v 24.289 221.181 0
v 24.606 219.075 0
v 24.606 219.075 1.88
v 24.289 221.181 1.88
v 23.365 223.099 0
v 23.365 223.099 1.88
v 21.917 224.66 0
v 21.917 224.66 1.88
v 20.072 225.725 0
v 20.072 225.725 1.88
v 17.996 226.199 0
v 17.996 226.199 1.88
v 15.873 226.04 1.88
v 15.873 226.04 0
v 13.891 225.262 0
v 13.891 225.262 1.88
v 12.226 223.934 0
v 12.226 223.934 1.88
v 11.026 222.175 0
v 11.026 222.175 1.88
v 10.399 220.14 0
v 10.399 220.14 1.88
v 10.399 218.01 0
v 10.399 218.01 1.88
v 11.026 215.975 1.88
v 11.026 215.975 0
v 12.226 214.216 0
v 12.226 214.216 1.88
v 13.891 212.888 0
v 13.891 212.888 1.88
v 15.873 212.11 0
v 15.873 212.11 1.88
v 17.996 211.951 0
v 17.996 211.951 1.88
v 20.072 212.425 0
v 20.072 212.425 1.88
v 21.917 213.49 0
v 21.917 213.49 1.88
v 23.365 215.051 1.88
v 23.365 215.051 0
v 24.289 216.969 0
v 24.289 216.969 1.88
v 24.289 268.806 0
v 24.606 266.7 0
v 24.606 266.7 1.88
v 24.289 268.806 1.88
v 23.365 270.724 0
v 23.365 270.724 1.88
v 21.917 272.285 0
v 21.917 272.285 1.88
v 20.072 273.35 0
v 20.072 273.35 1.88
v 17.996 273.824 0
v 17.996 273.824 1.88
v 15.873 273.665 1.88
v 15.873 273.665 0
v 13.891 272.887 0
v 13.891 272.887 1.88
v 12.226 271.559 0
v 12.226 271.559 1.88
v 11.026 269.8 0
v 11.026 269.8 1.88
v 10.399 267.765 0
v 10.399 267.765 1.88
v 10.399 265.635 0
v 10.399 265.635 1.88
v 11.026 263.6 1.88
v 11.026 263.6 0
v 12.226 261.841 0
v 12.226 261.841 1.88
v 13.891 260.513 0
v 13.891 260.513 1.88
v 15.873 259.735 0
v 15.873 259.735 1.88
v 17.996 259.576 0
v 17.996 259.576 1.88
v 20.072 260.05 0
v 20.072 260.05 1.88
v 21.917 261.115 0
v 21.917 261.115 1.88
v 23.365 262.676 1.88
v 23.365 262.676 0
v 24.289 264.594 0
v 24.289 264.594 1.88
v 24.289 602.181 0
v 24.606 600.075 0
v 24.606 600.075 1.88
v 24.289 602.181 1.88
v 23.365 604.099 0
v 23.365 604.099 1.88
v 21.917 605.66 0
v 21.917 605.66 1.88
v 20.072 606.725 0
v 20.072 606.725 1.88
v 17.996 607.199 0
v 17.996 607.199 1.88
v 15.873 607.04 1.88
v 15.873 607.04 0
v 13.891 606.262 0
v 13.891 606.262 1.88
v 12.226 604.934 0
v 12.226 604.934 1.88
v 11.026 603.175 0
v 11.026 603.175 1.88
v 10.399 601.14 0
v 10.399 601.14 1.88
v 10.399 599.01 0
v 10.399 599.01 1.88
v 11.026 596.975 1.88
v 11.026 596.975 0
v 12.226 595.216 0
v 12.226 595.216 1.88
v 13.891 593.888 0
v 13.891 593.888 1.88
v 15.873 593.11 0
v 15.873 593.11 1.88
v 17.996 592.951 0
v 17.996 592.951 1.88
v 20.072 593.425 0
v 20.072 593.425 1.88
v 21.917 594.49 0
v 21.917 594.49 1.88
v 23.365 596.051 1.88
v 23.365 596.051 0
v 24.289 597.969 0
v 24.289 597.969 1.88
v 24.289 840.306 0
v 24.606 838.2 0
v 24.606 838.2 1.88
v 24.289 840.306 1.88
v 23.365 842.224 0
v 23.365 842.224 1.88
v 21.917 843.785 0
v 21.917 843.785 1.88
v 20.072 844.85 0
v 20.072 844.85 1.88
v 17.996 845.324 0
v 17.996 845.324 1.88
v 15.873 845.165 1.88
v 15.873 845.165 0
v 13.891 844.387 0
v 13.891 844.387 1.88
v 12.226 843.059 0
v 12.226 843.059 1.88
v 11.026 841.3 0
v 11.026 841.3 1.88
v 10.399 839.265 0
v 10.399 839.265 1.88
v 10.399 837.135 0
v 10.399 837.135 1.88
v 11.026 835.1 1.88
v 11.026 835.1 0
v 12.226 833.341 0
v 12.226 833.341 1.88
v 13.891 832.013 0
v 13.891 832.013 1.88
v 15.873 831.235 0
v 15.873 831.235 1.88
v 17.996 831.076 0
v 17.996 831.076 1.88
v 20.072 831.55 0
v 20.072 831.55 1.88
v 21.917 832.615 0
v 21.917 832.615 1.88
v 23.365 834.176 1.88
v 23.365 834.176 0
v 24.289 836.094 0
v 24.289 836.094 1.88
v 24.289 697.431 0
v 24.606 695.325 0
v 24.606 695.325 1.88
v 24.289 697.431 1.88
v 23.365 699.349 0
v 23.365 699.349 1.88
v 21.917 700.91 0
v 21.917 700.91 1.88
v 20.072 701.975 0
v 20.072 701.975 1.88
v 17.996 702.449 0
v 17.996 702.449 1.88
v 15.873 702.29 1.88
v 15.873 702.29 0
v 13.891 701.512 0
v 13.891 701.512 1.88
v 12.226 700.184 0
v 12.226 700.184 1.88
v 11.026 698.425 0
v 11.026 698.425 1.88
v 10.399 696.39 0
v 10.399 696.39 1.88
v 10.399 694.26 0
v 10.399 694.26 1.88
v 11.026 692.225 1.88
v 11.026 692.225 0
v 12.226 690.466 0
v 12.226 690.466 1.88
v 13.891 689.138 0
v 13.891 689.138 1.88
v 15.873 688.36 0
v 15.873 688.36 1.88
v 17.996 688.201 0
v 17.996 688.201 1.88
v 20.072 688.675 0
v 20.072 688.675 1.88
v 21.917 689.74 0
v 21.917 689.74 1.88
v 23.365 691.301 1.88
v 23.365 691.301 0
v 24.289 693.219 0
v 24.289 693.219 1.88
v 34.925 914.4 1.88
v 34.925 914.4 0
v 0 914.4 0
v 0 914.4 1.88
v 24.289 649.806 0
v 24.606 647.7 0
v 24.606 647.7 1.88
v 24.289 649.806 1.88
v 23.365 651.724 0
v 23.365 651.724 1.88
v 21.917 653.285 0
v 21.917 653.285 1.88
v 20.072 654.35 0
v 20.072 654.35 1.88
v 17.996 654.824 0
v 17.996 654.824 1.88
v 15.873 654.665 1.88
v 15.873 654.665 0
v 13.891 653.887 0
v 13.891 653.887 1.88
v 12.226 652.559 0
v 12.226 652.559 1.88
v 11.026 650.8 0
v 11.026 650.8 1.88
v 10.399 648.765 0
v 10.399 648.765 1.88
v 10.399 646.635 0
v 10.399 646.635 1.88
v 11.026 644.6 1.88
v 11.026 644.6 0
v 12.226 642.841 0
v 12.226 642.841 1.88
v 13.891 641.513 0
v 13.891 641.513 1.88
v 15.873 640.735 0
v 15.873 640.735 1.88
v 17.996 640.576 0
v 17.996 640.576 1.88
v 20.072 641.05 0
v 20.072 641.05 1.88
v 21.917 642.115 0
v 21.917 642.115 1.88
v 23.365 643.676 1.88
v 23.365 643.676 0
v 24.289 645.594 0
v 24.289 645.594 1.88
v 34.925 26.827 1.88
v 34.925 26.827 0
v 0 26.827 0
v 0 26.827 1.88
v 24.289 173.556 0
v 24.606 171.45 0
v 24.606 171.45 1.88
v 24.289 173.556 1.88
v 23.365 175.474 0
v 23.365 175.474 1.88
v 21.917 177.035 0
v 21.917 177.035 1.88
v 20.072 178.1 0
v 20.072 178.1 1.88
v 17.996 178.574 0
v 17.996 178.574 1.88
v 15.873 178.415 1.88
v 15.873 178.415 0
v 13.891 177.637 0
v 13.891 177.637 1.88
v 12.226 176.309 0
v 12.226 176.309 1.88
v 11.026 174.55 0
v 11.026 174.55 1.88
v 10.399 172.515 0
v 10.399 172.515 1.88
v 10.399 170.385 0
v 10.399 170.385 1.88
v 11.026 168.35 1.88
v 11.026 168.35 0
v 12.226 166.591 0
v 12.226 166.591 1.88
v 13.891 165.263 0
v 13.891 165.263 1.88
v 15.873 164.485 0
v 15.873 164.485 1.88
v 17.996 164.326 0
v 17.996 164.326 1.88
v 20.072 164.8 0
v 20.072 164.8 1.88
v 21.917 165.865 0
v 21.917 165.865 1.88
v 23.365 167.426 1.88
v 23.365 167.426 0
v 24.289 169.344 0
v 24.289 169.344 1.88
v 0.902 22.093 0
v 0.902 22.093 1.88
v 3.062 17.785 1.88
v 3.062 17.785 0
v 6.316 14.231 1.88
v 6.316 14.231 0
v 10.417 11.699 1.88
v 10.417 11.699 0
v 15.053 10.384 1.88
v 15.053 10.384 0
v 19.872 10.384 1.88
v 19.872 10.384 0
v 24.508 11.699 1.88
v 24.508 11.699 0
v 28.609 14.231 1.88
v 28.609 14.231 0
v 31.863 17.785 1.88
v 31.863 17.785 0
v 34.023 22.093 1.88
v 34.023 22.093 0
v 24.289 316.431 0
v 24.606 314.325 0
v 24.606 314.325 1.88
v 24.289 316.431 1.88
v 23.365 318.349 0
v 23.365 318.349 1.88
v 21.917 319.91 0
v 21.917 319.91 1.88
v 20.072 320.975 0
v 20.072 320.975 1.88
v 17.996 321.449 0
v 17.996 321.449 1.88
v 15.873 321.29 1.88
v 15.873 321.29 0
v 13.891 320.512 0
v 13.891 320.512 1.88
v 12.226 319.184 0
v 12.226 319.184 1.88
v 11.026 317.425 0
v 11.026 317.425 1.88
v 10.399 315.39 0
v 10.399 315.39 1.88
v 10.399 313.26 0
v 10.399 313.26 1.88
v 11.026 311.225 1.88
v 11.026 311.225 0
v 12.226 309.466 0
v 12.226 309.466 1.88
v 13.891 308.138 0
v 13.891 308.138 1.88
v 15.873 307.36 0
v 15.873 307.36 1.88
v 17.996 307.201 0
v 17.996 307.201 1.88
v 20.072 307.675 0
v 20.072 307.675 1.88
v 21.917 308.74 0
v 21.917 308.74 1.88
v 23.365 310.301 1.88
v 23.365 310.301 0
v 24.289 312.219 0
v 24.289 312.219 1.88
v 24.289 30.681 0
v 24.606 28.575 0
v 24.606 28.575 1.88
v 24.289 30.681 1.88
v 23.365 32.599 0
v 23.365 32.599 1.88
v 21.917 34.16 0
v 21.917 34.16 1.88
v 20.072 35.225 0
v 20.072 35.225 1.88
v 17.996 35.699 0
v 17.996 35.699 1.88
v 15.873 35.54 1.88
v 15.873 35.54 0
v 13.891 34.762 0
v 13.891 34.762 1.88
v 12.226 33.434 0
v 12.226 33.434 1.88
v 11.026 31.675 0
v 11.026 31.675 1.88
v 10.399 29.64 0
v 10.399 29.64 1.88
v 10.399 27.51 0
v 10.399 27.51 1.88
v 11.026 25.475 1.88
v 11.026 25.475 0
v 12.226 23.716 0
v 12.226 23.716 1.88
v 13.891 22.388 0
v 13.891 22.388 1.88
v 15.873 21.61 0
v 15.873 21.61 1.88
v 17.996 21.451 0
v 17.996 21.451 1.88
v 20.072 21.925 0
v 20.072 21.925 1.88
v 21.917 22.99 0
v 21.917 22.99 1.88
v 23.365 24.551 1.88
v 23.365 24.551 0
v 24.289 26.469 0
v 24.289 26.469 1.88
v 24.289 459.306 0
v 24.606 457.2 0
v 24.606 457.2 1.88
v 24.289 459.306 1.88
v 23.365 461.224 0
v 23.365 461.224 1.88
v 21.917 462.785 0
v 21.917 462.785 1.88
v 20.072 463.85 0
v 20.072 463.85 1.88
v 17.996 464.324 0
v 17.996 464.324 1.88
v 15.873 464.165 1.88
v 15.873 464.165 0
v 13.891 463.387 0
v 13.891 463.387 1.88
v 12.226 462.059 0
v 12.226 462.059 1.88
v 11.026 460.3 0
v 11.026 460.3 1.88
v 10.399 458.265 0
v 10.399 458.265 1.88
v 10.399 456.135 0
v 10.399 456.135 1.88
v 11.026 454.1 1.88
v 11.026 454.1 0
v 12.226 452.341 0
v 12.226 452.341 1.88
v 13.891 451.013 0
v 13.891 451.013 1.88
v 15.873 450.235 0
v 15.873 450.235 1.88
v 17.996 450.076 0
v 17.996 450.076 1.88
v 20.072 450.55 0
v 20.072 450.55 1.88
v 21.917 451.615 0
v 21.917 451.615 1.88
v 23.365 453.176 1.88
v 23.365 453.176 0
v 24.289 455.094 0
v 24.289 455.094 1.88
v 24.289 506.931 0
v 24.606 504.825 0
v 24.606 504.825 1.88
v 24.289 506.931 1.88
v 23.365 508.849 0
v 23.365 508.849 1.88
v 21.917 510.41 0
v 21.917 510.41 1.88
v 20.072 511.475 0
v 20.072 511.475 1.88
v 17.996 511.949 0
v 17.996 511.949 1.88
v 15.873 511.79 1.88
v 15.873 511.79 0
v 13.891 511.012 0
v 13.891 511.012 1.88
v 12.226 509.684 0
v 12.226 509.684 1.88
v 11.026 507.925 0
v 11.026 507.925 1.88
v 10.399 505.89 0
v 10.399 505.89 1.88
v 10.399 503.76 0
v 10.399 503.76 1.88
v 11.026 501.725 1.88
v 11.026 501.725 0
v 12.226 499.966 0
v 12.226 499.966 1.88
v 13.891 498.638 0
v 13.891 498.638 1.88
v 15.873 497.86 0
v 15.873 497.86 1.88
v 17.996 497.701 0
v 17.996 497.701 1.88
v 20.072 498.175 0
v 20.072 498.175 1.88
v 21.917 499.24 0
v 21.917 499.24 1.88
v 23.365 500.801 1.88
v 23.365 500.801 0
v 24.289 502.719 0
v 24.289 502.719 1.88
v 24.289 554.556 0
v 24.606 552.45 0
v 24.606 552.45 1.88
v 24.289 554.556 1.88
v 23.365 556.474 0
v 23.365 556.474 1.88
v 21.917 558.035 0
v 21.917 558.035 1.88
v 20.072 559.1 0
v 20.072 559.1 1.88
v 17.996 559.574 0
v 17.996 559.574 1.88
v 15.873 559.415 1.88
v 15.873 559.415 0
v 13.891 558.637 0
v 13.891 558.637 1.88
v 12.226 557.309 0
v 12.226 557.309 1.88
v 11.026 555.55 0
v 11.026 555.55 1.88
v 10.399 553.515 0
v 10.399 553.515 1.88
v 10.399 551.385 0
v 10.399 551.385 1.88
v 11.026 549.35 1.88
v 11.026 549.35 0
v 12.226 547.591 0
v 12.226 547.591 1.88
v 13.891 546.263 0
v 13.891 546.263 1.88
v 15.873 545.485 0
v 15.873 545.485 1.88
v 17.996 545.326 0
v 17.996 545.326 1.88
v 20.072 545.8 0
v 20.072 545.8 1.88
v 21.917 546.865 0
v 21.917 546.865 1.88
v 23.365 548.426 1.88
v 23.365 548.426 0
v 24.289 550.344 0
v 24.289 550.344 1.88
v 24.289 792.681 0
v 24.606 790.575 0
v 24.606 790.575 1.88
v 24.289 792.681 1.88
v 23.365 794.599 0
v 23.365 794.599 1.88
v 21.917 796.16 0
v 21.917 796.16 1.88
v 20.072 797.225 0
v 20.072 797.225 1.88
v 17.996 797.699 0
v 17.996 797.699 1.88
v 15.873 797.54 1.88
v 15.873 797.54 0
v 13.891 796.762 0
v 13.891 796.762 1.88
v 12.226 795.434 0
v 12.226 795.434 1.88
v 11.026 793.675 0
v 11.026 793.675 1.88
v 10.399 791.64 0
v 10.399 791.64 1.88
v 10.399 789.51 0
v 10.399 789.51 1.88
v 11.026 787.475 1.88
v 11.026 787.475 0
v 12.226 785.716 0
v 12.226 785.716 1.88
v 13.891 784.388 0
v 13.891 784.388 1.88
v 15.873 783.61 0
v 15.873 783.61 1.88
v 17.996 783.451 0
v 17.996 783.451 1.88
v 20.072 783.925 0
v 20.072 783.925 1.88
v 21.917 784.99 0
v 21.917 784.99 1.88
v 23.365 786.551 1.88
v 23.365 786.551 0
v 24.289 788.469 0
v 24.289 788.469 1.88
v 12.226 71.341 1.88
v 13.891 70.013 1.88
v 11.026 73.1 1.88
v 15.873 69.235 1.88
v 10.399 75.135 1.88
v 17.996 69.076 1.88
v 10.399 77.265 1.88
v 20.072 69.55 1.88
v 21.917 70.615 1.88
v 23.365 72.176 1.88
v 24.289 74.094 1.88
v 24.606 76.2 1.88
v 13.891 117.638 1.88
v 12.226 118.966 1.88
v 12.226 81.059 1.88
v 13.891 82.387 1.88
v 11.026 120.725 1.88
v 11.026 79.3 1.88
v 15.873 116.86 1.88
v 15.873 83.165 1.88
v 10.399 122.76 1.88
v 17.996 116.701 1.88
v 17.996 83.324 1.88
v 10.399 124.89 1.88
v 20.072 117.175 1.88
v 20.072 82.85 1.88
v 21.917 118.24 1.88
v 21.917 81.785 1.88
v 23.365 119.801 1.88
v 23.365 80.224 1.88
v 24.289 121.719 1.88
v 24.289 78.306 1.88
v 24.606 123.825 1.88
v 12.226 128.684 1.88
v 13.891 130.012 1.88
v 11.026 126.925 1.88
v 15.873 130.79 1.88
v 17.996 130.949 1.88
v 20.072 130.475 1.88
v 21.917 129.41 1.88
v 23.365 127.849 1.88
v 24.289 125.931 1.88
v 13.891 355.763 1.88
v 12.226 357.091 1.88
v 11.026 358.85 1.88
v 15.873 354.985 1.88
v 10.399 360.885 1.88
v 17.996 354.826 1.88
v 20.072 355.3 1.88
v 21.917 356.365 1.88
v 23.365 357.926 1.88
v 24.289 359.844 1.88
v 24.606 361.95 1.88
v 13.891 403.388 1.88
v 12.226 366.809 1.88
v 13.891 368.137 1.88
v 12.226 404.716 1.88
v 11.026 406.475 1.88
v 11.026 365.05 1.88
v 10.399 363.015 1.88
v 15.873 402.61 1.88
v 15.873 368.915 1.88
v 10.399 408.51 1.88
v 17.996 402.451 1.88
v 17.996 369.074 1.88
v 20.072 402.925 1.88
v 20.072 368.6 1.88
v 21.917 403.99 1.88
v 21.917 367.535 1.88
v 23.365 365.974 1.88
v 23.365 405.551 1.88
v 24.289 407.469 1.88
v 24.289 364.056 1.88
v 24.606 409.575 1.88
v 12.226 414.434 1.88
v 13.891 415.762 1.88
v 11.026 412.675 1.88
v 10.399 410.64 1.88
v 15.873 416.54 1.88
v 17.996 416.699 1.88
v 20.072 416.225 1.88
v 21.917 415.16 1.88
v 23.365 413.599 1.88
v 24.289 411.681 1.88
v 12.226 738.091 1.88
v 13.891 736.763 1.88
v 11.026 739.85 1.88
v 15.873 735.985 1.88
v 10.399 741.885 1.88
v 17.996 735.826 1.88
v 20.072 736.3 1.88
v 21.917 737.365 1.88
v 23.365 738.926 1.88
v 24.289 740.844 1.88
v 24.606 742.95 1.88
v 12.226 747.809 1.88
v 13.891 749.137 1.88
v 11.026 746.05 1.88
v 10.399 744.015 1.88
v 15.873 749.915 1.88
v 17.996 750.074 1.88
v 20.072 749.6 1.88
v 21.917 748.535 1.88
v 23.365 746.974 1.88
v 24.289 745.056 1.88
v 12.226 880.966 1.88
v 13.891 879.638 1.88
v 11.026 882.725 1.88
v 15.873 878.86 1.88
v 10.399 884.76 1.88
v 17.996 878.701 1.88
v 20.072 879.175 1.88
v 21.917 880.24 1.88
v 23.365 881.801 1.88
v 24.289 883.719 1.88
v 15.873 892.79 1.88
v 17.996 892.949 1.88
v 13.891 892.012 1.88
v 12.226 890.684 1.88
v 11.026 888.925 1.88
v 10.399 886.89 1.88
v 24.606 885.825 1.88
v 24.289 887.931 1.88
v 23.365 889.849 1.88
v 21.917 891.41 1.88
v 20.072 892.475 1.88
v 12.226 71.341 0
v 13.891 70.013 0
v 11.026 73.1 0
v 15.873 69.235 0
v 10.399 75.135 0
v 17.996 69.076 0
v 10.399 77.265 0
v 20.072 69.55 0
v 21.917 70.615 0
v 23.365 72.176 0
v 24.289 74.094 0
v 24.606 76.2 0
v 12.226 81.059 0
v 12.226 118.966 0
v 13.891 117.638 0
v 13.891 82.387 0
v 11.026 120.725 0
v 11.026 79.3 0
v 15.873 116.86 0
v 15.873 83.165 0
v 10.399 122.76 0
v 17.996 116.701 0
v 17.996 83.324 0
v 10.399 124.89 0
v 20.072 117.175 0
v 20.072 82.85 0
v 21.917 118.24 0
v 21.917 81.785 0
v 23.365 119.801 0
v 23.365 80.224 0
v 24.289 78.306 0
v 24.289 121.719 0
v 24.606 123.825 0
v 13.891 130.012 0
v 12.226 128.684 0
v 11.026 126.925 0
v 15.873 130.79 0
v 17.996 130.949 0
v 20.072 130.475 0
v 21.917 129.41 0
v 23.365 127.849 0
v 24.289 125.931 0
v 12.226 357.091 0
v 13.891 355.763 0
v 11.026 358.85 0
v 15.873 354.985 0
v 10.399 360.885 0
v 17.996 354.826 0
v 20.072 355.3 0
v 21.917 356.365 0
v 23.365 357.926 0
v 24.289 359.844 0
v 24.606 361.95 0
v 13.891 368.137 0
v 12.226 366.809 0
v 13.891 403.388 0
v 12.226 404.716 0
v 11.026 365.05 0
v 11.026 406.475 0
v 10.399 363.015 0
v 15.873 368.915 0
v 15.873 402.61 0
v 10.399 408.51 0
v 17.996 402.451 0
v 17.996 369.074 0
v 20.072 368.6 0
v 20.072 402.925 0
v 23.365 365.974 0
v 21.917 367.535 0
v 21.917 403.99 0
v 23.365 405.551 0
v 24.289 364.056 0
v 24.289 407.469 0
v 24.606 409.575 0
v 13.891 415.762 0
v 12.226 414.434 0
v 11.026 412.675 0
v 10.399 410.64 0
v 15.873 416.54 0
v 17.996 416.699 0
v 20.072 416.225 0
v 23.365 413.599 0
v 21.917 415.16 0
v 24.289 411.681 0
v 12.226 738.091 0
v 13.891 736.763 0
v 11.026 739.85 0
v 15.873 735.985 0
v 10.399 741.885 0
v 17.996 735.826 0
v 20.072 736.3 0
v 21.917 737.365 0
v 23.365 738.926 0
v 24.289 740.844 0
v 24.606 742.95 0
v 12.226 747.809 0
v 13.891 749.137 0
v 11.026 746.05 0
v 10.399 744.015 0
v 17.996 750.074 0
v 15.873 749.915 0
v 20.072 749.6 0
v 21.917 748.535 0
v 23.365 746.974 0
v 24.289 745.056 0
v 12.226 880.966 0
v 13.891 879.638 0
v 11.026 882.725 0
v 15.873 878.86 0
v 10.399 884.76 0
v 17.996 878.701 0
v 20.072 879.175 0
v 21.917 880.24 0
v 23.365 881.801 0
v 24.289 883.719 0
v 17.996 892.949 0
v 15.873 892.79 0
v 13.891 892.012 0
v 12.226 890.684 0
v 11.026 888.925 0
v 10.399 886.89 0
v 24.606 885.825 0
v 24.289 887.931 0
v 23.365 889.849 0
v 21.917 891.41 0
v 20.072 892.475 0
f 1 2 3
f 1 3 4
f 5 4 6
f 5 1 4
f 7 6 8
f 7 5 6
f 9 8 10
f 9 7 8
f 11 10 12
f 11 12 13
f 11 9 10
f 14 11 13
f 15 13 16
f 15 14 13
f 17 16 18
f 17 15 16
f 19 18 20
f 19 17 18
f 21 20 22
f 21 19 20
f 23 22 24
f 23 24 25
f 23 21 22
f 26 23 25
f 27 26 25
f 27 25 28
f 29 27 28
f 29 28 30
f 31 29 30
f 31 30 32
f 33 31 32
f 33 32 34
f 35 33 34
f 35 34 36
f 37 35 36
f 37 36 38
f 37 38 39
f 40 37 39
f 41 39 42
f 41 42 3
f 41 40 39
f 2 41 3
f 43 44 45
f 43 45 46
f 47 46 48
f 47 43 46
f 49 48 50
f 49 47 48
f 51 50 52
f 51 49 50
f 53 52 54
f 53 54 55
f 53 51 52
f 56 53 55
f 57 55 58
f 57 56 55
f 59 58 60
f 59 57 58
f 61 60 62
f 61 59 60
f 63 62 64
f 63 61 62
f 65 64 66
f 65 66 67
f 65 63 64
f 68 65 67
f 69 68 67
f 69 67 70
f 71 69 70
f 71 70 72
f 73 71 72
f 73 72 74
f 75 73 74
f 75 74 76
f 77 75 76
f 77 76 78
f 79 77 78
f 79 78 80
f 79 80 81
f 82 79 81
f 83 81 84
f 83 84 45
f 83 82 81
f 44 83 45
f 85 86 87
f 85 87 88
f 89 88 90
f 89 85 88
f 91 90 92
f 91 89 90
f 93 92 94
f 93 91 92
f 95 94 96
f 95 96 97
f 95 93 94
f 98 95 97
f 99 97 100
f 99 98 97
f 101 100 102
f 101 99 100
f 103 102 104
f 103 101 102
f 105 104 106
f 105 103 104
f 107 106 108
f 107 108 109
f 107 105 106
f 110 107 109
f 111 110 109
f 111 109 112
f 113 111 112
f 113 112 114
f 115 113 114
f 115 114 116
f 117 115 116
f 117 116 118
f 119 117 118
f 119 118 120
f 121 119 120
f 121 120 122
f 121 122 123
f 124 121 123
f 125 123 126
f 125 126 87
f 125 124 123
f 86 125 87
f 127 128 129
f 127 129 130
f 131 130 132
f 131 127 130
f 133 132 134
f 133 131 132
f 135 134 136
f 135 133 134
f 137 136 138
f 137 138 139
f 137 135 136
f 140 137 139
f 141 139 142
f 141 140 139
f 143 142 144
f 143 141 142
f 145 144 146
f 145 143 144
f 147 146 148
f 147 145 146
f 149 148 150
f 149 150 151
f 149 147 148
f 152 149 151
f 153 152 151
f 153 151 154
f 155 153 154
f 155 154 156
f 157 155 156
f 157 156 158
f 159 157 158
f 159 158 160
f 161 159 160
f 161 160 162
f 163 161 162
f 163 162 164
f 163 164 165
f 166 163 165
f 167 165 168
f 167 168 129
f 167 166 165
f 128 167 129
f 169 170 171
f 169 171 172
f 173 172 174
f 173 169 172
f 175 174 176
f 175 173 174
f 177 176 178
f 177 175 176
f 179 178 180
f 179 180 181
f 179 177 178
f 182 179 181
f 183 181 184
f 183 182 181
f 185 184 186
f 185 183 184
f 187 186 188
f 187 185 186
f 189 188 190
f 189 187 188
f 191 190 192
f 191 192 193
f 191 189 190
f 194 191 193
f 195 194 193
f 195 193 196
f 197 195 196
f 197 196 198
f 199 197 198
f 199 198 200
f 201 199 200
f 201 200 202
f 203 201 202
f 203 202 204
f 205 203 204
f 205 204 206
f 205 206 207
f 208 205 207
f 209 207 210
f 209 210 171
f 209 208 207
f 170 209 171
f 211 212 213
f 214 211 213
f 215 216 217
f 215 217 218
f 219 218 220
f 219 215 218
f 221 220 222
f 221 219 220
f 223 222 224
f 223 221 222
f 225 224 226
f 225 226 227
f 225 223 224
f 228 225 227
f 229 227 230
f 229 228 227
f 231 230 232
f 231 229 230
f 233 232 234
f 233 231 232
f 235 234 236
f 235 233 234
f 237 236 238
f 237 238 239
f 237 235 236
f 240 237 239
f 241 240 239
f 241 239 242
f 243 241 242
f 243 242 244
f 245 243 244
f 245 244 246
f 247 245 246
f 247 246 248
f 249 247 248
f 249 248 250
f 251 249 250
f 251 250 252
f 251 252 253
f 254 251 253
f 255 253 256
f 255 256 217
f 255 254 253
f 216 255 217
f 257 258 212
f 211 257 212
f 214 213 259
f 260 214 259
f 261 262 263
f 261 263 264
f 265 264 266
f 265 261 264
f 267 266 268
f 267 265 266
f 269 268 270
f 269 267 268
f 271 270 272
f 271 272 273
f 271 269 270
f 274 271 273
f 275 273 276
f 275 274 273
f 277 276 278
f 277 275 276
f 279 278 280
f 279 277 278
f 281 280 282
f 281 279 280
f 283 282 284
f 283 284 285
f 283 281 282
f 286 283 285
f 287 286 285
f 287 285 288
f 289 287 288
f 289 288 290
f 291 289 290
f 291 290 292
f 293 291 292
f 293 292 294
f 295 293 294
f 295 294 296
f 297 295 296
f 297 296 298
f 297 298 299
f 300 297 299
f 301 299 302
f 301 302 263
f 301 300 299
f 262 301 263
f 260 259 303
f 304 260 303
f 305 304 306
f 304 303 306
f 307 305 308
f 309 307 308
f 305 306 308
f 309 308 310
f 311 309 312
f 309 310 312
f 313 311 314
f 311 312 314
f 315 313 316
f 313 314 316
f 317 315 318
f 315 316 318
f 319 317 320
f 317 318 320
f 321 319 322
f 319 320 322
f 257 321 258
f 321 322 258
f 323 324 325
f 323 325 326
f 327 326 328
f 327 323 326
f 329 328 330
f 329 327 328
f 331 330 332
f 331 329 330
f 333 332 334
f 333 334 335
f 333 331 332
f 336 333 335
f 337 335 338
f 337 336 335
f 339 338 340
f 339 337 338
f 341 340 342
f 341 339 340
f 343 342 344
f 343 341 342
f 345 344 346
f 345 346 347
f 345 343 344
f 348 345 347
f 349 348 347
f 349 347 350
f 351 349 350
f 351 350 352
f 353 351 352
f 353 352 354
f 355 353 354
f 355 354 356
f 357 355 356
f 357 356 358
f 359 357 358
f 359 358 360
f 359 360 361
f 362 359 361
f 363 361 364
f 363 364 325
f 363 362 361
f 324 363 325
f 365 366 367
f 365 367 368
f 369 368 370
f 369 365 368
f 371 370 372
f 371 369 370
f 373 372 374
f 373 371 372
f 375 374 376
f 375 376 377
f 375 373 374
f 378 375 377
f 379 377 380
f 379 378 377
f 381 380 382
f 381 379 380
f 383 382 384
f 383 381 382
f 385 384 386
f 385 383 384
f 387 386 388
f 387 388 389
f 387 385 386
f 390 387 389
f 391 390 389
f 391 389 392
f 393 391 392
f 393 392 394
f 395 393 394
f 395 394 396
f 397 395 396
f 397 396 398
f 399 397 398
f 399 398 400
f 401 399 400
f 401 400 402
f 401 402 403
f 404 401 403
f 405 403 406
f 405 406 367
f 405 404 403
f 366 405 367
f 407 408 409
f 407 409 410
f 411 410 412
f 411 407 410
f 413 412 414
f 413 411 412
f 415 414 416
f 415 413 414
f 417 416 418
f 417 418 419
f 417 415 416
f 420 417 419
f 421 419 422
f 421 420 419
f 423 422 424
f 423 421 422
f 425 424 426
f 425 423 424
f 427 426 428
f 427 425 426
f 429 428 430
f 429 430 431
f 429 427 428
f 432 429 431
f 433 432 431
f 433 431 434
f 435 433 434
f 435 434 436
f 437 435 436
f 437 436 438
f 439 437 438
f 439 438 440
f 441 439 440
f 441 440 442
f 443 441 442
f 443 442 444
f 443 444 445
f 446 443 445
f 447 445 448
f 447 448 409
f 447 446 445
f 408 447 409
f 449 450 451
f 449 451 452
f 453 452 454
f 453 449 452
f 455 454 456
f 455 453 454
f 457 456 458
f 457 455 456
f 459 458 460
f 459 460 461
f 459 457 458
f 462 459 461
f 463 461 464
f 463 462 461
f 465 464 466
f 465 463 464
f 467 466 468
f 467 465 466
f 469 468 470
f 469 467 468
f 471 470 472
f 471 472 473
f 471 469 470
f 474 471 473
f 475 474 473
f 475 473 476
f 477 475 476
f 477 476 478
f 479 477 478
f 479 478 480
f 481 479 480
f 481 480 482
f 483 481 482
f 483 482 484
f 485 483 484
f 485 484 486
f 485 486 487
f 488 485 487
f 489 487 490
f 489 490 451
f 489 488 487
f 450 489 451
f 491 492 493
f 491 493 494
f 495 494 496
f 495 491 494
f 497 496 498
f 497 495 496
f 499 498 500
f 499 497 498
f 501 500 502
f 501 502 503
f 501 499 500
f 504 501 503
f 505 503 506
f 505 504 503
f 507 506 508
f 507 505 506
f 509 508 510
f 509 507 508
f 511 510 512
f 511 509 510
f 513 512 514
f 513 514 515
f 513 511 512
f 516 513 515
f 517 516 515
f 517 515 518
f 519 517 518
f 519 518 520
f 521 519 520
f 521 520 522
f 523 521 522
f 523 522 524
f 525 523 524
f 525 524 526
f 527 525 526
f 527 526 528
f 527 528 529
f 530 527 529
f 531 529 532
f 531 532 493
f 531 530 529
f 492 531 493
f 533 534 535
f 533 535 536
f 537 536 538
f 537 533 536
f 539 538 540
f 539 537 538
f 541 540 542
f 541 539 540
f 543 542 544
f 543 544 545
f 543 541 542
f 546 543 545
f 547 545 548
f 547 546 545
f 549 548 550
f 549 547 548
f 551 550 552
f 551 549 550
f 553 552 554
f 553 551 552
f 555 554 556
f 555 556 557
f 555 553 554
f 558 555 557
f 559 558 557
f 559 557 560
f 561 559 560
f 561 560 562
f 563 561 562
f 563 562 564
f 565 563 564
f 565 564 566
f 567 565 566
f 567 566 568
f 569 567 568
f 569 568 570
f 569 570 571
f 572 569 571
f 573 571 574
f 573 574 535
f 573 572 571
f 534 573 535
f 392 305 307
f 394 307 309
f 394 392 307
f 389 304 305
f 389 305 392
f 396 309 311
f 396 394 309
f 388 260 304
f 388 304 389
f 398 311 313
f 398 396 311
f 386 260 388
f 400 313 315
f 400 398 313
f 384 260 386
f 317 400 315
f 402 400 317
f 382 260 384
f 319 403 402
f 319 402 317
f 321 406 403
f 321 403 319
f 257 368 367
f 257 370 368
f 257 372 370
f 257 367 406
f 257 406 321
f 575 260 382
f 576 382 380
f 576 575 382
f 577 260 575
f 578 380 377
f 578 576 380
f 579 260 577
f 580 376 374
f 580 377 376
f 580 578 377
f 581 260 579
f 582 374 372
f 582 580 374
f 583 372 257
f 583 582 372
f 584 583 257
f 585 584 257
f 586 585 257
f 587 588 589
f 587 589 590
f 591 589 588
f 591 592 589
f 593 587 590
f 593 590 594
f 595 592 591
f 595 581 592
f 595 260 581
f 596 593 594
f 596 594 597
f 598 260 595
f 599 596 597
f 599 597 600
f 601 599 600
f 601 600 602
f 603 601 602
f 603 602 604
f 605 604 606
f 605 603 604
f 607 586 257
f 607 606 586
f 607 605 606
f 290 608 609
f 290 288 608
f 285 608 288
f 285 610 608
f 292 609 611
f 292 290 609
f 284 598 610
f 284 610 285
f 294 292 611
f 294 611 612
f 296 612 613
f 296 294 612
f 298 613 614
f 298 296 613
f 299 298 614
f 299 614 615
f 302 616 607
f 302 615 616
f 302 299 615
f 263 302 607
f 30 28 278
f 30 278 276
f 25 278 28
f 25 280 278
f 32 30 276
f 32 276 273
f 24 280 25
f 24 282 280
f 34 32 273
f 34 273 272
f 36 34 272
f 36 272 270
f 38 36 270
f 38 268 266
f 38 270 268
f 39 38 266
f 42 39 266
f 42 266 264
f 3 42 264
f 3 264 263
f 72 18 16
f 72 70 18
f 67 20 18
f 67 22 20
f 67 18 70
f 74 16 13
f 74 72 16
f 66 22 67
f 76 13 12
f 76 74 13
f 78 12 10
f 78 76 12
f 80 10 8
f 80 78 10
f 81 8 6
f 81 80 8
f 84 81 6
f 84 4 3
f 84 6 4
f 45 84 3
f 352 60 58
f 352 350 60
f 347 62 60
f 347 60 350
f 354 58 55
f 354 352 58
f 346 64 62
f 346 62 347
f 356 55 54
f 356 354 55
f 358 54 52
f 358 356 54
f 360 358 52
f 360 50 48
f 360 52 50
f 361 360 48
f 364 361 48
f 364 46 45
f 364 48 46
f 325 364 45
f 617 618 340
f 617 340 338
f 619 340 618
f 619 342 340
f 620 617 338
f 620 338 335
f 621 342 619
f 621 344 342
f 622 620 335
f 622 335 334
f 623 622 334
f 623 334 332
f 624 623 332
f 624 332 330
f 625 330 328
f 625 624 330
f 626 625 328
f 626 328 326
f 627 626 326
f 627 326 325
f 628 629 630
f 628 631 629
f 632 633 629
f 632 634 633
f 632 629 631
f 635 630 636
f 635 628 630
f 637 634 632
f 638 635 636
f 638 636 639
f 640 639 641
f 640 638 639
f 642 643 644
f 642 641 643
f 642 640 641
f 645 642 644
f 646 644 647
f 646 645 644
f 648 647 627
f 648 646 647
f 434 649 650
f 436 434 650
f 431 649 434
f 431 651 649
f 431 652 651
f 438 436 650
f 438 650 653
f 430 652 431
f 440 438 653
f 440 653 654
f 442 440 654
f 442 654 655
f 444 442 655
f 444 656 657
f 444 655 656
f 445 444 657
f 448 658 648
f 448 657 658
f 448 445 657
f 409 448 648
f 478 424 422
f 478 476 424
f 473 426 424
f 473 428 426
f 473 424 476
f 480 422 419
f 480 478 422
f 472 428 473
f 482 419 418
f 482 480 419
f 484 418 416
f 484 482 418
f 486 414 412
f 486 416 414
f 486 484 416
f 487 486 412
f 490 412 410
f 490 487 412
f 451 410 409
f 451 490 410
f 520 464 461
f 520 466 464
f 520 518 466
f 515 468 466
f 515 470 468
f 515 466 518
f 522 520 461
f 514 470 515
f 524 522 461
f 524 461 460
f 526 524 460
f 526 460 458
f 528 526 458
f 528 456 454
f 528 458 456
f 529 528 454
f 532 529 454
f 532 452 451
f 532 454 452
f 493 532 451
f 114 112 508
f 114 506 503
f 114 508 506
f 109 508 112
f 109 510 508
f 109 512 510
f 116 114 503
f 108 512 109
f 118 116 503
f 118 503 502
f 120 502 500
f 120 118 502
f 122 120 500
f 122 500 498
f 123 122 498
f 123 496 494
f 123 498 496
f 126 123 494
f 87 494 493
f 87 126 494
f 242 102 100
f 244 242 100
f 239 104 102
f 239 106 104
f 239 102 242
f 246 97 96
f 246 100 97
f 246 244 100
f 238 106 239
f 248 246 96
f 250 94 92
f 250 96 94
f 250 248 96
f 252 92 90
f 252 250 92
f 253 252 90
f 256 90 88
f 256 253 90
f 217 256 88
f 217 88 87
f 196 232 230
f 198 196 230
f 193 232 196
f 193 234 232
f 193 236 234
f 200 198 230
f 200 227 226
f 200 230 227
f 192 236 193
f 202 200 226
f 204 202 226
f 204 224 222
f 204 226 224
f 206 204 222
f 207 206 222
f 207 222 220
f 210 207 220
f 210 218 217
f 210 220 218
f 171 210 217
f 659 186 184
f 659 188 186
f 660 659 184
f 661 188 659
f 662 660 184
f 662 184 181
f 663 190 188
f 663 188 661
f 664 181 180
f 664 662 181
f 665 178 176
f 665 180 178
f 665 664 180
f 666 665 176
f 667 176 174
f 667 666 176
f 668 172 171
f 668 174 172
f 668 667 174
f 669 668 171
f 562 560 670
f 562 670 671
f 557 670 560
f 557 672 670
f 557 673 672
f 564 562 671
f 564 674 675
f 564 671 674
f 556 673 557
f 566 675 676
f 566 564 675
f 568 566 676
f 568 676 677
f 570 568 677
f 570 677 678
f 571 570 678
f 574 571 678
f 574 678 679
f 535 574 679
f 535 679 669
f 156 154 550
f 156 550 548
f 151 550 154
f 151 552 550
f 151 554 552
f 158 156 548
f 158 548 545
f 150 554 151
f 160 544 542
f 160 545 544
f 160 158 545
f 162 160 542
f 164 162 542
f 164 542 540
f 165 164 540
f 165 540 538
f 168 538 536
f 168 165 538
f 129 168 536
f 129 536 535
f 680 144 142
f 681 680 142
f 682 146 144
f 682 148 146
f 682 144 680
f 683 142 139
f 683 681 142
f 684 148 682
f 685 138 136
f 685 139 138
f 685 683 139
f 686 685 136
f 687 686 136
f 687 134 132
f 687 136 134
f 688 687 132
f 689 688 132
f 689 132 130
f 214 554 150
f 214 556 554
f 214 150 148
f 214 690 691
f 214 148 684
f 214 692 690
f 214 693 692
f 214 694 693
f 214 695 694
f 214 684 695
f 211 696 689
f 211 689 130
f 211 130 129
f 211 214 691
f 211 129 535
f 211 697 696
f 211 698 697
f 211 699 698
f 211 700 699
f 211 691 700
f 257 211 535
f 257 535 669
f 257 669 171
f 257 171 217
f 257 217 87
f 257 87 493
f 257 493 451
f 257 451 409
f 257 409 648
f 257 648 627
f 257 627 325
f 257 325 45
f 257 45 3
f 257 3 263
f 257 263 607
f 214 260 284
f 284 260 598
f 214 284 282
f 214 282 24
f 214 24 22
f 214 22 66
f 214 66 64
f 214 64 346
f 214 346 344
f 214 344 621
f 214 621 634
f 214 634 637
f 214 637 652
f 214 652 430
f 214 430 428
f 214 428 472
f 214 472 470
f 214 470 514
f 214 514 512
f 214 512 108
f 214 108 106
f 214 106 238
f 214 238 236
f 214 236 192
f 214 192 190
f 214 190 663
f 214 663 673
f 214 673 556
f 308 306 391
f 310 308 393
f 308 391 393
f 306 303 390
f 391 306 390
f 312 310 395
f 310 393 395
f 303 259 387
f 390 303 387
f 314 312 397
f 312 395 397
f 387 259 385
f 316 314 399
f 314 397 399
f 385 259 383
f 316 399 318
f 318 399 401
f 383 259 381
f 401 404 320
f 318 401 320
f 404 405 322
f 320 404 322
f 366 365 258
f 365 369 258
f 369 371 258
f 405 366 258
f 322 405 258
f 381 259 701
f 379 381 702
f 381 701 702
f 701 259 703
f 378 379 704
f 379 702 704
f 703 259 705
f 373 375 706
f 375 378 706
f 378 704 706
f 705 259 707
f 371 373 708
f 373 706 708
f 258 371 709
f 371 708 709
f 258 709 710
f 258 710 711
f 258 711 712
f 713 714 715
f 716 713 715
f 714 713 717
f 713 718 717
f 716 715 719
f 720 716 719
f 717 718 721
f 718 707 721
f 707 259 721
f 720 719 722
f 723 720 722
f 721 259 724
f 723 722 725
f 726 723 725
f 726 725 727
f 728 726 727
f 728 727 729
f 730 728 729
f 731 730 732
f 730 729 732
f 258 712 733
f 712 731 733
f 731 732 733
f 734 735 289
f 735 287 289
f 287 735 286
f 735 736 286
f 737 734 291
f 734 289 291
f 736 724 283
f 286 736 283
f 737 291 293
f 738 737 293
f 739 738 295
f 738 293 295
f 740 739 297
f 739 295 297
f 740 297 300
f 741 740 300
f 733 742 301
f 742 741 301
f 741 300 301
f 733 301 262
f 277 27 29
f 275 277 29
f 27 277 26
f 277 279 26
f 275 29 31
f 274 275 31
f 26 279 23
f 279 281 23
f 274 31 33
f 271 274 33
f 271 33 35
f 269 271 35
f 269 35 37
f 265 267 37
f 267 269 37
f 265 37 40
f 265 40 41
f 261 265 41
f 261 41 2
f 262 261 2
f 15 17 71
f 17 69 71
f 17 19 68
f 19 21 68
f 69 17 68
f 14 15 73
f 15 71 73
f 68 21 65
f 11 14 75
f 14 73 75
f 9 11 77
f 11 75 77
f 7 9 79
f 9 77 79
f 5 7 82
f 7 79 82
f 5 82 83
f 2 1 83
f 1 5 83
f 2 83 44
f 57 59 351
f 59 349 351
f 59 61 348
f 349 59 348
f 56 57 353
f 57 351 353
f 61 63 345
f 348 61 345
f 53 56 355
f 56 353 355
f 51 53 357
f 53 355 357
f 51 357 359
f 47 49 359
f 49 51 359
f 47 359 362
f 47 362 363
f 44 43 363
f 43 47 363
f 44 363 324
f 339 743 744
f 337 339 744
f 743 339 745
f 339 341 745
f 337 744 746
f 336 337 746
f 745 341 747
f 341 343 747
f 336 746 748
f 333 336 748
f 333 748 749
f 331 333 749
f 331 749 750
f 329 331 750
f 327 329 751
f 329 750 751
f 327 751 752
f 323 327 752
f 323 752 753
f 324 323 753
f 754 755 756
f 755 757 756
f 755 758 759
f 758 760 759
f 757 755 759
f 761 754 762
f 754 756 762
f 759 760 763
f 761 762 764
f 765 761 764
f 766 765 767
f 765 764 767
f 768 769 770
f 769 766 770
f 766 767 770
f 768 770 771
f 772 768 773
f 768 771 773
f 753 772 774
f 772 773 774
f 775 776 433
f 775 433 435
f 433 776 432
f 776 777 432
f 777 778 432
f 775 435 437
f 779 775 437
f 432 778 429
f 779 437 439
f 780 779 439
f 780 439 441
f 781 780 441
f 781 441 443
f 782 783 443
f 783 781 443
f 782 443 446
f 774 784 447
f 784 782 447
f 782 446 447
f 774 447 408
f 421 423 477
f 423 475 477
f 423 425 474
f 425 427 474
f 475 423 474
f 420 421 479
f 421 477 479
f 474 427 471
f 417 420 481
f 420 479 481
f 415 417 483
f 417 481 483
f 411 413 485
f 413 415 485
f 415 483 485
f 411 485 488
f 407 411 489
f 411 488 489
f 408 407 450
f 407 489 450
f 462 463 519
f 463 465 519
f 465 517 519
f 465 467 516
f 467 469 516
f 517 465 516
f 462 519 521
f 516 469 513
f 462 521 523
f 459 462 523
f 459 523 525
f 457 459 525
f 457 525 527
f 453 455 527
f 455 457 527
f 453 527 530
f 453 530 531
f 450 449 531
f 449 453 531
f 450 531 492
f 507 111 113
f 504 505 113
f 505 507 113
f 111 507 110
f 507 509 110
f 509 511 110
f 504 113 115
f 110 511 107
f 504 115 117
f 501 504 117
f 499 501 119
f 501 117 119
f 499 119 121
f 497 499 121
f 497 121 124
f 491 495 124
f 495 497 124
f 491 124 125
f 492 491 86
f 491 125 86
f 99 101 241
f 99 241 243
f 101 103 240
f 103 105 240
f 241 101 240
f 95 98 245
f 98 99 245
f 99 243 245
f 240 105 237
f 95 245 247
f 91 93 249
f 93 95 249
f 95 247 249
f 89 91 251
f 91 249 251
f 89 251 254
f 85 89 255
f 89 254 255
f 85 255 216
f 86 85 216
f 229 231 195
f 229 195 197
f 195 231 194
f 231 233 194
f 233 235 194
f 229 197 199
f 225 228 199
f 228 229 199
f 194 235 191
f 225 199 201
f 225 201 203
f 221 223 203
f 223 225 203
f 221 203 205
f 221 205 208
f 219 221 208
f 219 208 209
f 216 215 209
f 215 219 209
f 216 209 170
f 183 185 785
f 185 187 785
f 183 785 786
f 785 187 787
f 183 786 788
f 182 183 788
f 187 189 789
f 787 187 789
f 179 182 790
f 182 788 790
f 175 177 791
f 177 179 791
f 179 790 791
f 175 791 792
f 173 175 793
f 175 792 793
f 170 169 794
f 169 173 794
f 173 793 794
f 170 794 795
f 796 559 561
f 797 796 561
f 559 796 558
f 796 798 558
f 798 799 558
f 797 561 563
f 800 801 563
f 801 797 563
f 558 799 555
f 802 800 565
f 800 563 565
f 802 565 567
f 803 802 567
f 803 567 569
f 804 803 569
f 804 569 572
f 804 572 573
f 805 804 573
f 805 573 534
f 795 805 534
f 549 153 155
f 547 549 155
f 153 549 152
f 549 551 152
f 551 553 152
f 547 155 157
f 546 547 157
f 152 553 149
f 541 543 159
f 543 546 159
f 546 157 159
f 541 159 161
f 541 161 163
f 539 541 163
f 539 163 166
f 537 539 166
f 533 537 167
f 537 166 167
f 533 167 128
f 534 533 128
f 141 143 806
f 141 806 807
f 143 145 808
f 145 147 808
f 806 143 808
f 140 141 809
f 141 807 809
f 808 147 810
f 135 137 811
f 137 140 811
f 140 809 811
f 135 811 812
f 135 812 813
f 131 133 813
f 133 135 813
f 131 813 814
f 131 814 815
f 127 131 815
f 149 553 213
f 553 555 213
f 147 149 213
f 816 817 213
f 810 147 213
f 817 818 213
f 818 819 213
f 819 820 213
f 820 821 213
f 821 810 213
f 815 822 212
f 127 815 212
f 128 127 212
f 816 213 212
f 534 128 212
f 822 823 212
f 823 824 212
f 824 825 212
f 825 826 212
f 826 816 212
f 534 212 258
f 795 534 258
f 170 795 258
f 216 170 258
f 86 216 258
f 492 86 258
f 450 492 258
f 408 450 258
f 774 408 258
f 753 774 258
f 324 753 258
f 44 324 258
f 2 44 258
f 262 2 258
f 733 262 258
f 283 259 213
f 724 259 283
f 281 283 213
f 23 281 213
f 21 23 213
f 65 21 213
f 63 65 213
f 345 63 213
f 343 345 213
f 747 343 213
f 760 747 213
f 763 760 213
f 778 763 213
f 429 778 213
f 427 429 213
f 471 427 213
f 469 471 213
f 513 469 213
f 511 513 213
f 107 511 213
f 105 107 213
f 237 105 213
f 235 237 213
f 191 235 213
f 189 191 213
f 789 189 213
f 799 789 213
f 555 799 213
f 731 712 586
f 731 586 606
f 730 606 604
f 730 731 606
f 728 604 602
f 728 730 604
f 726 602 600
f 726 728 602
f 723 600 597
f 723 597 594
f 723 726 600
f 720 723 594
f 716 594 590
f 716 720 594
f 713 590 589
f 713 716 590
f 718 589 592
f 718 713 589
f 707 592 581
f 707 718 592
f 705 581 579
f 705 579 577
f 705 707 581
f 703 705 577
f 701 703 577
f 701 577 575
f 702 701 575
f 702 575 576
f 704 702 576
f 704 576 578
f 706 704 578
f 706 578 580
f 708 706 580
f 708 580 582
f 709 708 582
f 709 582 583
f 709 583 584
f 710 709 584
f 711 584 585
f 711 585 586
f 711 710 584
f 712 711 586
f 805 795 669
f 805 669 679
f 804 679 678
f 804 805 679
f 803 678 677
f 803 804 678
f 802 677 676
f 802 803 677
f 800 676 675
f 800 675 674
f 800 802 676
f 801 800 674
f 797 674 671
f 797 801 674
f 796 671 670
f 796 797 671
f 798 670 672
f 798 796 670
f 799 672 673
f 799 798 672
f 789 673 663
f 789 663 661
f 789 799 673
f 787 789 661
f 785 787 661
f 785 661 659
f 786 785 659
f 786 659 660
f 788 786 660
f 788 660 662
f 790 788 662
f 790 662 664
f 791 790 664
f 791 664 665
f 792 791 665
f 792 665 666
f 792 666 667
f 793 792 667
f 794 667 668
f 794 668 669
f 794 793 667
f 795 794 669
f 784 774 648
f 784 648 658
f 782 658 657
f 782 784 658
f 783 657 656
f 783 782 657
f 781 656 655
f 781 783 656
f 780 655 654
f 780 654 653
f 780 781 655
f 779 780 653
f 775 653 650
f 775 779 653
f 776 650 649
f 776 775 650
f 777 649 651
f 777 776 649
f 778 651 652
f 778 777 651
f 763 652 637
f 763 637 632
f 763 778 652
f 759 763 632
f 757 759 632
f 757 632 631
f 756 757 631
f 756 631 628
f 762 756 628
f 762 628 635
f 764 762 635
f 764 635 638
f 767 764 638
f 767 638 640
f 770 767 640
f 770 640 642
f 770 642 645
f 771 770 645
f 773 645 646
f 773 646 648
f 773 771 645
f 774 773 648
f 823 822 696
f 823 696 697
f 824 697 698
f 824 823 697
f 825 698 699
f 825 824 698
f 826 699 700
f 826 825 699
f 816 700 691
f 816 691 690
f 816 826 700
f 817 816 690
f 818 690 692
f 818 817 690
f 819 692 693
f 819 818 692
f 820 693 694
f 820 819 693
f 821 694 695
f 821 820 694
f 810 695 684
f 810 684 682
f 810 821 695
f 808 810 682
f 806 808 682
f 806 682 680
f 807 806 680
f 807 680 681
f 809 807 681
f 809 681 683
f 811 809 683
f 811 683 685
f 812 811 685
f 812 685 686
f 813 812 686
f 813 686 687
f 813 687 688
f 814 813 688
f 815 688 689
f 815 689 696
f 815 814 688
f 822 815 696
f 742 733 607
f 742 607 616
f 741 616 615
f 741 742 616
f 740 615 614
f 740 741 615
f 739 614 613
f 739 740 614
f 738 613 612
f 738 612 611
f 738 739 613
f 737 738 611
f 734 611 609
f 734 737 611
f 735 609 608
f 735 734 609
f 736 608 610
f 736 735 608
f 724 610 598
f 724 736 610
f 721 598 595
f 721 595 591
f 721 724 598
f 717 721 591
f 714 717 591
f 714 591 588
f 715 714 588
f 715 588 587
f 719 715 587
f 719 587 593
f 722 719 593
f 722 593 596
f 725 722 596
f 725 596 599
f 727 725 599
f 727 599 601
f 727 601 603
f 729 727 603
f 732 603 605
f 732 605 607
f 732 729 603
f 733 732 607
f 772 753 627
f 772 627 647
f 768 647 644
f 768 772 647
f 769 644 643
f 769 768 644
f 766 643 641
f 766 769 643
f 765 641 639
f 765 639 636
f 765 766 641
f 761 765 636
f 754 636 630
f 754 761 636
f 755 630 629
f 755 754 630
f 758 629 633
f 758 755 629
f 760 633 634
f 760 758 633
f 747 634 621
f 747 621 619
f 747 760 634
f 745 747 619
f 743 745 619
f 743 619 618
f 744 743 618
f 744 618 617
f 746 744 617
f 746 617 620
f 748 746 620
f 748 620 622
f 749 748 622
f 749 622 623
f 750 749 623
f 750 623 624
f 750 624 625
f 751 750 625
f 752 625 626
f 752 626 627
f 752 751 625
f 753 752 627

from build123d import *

# Parameters (mm, degrees)
F0_R     = 7.14375
F1_DEPTH = 1.8796


with BuildPart() as f1:
    # F0 (on Top) → F1 (new body)
    with BuildSketch(Plane.XY):
        with BuildLine():
            Line((0, 28.575), (0, 26.827432))
            ThreePointArc((0, 26.827432), (17.4625, 10.216869), (34.925, 26.827432))
            Line((34.925, 26.827432), (34.925, 28.575))
            Line((34.925, 28.575), (34.925, 914.4))
            Line((34.925, 914.4), (0, 914.4))
            Line((0, 914.4), (0, 28.575))
        make_face()
        with Locations((17.4625, 28.575)):
            Circle(F0_R, mode=Mode.SUBTRACT)
        with Locations((17.4625, 76.2)):
            Circle(F0_R, mode=Mode.SUBTRACT)
        with Locations((17.4625, 123.825)):
            Circle(F0_R, mode=Mode.SUBTRACT)
        with Locations((17.4625, 171.45)):
            Circle(F0_R, mode=Mode.SUBTRACT)
        with Locations((17.4625, 219.075)):
            Circle(F0_R, mode=Mode.SUBTRACT)
        with Locations((17.4625, 266.7)):
            Circle(F0_R, mode=Mode.SUBTRACT)
        with Locations((17.4625, 314.325)):
            Circle(F0_R, mode=Mode.SUBTRACT)
        with Locations((17.4625, 361.95)):
            Circle(F0_R, mode=Mode.SUBTRACT)
        with Locations((17.4625, 409.575)):
            Circle(F0_R, mode=Mode.SUBTRACT)
        with Locations((17.4625, 457.2)):
            Circle(F0_R, mode=Mode.SUBTRACT)
        with Locations((17.4625, 504.825)):
            Circle(F0_R, mode=Mode.SUBTRACT)
        with Locations((17.4625, 552.45)):
            Circle(F0_R, mode=Mode.SUBTRACT)
        with Locations((17.4625, 600.075)):
            Circle(F0_R, mode=Mode.SUBTRACT)
        with Locations((17.4625, 647.7)):
            Circle(F0_R, mode=Mode.SUBTRACT)
        with Locations((17.4625, 695.325)):
            Circle(F0_R, mode=Mode.SUBTRACT)
        with Locations((17.4625, 742.95)):
            Circle(F0_R, mode=Mode.SUBTRACT)
        with Locations((17.4625, 790.575)):
            Circle(F0_R, mode=Mode.SUBTRACT)
        with Locations((17.4625, 838.2)):
            Circle(F0_R, mode=Mode.SUBTRACT)
        with Locations((17.4625, 885.825)):
            Circle(F0_R, mode=Mode.SUBTRACT)
    extrude(amount=F1_DEPTH)


solid = f1.part
